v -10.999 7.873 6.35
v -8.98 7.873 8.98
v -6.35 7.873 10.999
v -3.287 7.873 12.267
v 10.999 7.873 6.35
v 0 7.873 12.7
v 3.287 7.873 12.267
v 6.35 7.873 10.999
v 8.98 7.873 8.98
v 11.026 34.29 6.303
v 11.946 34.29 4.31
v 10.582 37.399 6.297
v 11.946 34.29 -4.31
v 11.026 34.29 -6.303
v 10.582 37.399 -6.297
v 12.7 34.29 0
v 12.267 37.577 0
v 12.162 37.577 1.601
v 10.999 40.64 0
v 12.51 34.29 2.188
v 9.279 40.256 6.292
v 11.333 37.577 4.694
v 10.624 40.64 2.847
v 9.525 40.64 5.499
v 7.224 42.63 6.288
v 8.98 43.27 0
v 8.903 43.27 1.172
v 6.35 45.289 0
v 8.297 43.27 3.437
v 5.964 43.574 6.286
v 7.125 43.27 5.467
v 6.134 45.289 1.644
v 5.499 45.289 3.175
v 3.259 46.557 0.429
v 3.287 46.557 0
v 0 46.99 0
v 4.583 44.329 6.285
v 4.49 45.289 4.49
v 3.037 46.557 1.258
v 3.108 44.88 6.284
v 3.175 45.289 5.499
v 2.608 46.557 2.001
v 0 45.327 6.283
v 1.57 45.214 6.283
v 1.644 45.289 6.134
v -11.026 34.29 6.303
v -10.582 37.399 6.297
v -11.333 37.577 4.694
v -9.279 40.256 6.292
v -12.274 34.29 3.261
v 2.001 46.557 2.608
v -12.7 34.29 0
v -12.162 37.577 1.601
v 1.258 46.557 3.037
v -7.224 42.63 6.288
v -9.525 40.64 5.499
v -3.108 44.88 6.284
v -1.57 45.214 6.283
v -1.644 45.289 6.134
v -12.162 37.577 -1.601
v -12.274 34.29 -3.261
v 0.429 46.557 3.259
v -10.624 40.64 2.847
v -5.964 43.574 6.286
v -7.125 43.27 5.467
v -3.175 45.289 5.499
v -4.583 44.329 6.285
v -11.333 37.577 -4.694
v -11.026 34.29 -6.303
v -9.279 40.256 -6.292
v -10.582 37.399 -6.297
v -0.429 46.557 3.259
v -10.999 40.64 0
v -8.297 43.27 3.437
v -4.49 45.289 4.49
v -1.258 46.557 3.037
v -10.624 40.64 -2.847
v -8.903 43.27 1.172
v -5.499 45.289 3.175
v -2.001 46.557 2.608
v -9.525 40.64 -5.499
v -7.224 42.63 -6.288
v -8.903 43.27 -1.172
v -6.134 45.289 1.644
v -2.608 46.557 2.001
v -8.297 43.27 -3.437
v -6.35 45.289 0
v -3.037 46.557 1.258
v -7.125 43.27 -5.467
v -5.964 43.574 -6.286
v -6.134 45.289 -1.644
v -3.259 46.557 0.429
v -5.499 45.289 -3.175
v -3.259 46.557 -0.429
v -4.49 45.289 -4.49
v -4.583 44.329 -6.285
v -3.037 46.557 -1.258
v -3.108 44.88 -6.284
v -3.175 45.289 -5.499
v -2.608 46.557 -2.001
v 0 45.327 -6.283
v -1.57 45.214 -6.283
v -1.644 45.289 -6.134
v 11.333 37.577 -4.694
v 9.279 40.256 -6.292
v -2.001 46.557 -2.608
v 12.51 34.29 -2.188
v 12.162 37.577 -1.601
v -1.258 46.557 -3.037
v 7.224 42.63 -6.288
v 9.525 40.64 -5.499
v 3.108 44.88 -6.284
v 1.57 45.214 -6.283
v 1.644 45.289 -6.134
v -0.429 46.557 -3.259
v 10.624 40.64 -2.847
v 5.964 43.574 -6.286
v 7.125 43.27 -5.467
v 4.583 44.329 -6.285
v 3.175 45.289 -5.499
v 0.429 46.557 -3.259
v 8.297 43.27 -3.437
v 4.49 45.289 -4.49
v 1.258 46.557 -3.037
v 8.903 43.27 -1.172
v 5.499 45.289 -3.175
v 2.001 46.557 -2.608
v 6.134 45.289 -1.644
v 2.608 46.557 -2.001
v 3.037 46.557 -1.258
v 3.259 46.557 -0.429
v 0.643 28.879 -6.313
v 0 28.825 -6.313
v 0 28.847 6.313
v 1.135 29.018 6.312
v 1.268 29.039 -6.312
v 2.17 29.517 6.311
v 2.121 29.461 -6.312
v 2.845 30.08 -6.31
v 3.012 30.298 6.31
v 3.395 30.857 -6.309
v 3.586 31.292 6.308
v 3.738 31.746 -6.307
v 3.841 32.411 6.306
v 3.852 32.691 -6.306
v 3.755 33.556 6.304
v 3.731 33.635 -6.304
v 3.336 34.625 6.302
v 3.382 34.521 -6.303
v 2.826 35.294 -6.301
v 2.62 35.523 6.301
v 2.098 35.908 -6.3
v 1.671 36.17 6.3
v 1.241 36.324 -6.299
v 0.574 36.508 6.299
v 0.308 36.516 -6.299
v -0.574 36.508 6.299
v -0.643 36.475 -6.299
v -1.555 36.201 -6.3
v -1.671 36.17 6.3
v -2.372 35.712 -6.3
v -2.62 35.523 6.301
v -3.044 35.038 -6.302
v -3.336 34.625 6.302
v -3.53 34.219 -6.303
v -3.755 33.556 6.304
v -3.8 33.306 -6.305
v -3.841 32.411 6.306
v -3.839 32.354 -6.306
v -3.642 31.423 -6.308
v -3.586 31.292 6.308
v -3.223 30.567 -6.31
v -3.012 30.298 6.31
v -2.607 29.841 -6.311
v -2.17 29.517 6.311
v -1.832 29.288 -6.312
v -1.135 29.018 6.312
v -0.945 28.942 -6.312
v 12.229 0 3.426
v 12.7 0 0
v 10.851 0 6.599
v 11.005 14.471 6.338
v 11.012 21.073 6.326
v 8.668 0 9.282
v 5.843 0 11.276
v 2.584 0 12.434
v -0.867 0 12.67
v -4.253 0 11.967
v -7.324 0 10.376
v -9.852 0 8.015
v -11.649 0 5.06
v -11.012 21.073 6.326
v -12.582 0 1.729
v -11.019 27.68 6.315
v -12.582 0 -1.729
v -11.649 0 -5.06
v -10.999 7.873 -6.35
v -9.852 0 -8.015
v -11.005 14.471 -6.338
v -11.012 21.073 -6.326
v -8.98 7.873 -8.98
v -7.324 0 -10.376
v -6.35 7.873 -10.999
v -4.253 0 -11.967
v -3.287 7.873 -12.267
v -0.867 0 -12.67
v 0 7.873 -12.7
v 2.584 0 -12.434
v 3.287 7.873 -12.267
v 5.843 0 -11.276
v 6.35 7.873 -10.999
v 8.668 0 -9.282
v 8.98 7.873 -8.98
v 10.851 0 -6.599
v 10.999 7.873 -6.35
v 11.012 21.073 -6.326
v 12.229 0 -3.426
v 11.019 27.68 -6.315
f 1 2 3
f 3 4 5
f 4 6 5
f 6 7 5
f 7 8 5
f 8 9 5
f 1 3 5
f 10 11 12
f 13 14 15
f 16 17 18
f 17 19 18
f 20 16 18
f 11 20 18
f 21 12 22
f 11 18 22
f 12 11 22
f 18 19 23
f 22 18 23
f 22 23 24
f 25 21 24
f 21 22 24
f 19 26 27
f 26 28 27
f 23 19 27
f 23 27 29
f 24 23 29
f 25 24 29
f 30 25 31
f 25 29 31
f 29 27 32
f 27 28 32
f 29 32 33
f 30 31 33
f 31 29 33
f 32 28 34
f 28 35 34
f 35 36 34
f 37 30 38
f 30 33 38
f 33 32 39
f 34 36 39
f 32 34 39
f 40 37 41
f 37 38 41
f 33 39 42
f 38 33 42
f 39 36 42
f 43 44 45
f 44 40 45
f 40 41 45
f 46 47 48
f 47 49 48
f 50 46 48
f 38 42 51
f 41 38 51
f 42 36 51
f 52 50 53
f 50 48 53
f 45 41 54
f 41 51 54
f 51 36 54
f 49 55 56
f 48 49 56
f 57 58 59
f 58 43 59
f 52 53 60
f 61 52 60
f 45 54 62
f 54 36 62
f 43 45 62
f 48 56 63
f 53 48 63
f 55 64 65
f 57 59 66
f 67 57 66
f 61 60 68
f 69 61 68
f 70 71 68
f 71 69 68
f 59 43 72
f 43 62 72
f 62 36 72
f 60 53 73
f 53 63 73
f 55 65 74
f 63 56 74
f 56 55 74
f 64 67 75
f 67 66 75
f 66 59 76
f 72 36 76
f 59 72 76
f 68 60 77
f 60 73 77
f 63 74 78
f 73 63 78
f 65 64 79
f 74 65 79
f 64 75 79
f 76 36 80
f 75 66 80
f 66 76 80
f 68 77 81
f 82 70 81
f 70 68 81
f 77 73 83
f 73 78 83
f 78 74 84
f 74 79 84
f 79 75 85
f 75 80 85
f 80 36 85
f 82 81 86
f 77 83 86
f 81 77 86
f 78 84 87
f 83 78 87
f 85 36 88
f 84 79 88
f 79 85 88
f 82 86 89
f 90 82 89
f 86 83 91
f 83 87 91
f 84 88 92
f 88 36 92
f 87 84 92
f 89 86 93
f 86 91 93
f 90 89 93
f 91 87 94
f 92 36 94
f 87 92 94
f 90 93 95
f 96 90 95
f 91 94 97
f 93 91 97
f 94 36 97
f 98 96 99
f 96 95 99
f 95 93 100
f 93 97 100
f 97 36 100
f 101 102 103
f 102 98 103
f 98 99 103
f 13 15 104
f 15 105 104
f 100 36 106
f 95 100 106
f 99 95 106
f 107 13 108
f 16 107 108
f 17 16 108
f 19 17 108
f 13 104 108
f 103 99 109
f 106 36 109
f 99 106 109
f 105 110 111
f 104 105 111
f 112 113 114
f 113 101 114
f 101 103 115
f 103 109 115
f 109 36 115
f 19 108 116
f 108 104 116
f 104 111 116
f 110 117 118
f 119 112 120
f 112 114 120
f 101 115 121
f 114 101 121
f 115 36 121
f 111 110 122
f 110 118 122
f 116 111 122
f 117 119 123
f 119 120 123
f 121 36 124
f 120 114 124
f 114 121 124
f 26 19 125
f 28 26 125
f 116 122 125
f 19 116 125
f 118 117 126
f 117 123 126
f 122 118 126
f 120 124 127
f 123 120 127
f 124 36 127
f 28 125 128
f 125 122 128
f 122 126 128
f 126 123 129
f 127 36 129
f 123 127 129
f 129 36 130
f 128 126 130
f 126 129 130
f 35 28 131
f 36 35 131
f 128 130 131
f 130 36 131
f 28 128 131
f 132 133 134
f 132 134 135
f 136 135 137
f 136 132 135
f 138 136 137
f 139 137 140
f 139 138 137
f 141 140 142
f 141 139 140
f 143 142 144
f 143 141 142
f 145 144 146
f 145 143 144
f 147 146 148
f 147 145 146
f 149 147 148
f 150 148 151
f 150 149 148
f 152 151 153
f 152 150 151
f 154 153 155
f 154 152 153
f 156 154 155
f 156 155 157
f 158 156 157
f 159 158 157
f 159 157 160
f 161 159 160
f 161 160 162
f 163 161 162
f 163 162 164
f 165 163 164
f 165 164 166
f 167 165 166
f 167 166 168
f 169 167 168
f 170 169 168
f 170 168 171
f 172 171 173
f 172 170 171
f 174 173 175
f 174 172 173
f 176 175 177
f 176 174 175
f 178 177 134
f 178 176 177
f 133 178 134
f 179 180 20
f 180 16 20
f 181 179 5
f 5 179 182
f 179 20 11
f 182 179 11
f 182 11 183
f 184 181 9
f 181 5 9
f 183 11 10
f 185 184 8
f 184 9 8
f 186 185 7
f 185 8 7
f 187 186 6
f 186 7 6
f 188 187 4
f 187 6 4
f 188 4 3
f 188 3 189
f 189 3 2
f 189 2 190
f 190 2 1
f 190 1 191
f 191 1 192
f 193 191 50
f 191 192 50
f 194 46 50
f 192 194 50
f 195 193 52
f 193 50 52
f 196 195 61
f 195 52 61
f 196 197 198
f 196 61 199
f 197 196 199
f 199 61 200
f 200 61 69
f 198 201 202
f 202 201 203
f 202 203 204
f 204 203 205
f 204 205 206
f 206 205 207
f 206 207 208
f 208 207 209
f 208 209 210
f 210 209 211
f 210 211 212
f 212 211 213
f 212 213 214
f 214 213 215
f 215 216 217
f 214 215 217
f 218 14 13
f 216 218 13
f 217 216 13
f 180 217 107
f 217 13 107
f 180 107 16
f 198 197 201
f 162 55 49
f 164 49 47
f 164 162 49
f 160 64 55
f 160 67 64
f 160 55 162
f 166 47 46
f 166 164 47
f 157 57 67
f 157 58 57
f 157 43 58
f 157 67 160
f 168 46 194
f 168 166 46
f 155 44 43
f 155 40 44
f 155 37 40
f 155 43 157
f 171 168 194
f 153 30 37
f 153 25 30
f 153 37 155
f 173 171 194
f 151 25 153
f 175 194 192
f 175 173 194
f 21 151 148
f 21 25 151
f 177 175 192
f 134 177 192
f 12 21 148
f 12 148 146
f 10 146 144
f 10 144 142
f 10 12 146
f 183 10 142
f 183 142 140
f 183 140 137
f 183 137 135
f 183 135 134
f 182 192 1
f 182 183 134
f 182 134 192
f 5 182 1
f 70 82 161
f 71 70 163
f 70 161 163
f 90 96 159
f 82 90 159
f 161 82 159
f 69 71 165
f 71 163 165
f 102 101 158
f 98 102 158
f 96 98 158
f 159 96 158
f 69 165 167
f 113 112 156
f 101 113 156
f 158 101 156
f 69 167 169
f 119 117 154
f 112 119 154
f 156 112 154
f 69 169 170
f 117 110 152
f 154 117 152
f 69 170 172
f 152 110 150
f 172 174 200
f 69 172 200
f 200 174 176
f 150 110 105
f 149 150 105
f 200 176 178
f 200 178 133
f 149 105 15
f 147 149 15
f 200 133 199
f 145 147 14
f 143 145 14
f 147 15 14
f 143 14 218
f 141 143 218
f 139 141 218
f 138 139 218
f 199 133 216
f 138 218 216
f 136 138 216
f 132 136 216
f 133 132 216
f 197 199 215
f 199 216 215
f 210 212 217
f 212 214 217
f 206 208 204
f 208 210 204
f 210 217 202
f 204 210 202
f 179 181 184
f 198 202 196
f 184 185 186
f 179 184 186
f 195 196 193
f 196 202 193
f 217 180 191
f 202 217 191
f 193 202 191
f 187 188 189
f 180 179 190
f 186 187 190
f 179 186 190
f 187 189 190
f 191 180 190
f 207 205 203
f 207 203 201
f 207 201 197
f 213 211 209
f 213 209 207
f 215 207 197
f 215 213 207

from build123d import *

# Parameters (mm, degrees)
CUT_EXTRUDE1_DEPTH      = 51.305467894
CUT_EXTRUDE2_DEPTH      = 53.265868848
CUT_EXTRUDE2_DEPTH_BACK = 53.265868848
SKETCH6_R               = 3.852050009


with BuildPart() as part:
    # Sketch3 → Revolve1 (revolve)
    with BuildSketch(Plane.XY):
        with BuildLine():
            Line((0, 46.99), (0, 0))
            Line((0, 0), (12.7, 0))
            Line((12.7, 0), (12.7, 34.29))
            ThreePointArc((12.7, 34.29), (8.980256121, 43.270256121), (0, 46.99))
        make_face()
    revolve(axis=Axis((0, 46.99, 0), (0, -1, 0)))

    # Sketch4 → Cut-Extrude1 (cut, symmetric)
    with BuildSketch(Plane(origin=(0, 0, 0), x_dir=(0, 0, -1), z_dir=(1, 0, 0))):
        Polygon((-6.28327957, 45.326774794), (-6.35, 7.872595515), (-12.7, 7.872595515), (-15.471425878, 7.872595515), (-17.507867096, 7.199216011), (-21.88483387, 7.199216011), (-21.88483387, 45.326774794), align=None)
    cut_extrude1 = extrude(amount=CUT_EXTRUDE1_DEPTH, both=True, mode=Mode.SUBTRACT)

    # Mirror1: Cut-Extrude1 across plane
    add(cut_extrude1.mirror(Plane.XY), mode=Mode.SUBTRACT)

    # Sketch6 → Cut-Extrude2 (cut, two sides: drawn at the far end of the back side and taken through both)
    with BuildSketch(Plane(origin=(0, 0.011336761, 6.364003953), x_dir=(1, 0, 0), z_dir=(0, 0.0017813853062925587, 0.9999984133319366)).offset(-CUT_EXTRUDE2_DEPTH_BACK)):
        with Locations(Location((0, 32.687978784, 0), (0, 0, 270))):
            Circle(SKETCH6_R)
    extrude(amount=CUT_EXTRUDE2_DEPTH + CUT_EXTRUDE2_DEPTH_BACK, mode=Mode.SUBTRACT)


solid = part.part
